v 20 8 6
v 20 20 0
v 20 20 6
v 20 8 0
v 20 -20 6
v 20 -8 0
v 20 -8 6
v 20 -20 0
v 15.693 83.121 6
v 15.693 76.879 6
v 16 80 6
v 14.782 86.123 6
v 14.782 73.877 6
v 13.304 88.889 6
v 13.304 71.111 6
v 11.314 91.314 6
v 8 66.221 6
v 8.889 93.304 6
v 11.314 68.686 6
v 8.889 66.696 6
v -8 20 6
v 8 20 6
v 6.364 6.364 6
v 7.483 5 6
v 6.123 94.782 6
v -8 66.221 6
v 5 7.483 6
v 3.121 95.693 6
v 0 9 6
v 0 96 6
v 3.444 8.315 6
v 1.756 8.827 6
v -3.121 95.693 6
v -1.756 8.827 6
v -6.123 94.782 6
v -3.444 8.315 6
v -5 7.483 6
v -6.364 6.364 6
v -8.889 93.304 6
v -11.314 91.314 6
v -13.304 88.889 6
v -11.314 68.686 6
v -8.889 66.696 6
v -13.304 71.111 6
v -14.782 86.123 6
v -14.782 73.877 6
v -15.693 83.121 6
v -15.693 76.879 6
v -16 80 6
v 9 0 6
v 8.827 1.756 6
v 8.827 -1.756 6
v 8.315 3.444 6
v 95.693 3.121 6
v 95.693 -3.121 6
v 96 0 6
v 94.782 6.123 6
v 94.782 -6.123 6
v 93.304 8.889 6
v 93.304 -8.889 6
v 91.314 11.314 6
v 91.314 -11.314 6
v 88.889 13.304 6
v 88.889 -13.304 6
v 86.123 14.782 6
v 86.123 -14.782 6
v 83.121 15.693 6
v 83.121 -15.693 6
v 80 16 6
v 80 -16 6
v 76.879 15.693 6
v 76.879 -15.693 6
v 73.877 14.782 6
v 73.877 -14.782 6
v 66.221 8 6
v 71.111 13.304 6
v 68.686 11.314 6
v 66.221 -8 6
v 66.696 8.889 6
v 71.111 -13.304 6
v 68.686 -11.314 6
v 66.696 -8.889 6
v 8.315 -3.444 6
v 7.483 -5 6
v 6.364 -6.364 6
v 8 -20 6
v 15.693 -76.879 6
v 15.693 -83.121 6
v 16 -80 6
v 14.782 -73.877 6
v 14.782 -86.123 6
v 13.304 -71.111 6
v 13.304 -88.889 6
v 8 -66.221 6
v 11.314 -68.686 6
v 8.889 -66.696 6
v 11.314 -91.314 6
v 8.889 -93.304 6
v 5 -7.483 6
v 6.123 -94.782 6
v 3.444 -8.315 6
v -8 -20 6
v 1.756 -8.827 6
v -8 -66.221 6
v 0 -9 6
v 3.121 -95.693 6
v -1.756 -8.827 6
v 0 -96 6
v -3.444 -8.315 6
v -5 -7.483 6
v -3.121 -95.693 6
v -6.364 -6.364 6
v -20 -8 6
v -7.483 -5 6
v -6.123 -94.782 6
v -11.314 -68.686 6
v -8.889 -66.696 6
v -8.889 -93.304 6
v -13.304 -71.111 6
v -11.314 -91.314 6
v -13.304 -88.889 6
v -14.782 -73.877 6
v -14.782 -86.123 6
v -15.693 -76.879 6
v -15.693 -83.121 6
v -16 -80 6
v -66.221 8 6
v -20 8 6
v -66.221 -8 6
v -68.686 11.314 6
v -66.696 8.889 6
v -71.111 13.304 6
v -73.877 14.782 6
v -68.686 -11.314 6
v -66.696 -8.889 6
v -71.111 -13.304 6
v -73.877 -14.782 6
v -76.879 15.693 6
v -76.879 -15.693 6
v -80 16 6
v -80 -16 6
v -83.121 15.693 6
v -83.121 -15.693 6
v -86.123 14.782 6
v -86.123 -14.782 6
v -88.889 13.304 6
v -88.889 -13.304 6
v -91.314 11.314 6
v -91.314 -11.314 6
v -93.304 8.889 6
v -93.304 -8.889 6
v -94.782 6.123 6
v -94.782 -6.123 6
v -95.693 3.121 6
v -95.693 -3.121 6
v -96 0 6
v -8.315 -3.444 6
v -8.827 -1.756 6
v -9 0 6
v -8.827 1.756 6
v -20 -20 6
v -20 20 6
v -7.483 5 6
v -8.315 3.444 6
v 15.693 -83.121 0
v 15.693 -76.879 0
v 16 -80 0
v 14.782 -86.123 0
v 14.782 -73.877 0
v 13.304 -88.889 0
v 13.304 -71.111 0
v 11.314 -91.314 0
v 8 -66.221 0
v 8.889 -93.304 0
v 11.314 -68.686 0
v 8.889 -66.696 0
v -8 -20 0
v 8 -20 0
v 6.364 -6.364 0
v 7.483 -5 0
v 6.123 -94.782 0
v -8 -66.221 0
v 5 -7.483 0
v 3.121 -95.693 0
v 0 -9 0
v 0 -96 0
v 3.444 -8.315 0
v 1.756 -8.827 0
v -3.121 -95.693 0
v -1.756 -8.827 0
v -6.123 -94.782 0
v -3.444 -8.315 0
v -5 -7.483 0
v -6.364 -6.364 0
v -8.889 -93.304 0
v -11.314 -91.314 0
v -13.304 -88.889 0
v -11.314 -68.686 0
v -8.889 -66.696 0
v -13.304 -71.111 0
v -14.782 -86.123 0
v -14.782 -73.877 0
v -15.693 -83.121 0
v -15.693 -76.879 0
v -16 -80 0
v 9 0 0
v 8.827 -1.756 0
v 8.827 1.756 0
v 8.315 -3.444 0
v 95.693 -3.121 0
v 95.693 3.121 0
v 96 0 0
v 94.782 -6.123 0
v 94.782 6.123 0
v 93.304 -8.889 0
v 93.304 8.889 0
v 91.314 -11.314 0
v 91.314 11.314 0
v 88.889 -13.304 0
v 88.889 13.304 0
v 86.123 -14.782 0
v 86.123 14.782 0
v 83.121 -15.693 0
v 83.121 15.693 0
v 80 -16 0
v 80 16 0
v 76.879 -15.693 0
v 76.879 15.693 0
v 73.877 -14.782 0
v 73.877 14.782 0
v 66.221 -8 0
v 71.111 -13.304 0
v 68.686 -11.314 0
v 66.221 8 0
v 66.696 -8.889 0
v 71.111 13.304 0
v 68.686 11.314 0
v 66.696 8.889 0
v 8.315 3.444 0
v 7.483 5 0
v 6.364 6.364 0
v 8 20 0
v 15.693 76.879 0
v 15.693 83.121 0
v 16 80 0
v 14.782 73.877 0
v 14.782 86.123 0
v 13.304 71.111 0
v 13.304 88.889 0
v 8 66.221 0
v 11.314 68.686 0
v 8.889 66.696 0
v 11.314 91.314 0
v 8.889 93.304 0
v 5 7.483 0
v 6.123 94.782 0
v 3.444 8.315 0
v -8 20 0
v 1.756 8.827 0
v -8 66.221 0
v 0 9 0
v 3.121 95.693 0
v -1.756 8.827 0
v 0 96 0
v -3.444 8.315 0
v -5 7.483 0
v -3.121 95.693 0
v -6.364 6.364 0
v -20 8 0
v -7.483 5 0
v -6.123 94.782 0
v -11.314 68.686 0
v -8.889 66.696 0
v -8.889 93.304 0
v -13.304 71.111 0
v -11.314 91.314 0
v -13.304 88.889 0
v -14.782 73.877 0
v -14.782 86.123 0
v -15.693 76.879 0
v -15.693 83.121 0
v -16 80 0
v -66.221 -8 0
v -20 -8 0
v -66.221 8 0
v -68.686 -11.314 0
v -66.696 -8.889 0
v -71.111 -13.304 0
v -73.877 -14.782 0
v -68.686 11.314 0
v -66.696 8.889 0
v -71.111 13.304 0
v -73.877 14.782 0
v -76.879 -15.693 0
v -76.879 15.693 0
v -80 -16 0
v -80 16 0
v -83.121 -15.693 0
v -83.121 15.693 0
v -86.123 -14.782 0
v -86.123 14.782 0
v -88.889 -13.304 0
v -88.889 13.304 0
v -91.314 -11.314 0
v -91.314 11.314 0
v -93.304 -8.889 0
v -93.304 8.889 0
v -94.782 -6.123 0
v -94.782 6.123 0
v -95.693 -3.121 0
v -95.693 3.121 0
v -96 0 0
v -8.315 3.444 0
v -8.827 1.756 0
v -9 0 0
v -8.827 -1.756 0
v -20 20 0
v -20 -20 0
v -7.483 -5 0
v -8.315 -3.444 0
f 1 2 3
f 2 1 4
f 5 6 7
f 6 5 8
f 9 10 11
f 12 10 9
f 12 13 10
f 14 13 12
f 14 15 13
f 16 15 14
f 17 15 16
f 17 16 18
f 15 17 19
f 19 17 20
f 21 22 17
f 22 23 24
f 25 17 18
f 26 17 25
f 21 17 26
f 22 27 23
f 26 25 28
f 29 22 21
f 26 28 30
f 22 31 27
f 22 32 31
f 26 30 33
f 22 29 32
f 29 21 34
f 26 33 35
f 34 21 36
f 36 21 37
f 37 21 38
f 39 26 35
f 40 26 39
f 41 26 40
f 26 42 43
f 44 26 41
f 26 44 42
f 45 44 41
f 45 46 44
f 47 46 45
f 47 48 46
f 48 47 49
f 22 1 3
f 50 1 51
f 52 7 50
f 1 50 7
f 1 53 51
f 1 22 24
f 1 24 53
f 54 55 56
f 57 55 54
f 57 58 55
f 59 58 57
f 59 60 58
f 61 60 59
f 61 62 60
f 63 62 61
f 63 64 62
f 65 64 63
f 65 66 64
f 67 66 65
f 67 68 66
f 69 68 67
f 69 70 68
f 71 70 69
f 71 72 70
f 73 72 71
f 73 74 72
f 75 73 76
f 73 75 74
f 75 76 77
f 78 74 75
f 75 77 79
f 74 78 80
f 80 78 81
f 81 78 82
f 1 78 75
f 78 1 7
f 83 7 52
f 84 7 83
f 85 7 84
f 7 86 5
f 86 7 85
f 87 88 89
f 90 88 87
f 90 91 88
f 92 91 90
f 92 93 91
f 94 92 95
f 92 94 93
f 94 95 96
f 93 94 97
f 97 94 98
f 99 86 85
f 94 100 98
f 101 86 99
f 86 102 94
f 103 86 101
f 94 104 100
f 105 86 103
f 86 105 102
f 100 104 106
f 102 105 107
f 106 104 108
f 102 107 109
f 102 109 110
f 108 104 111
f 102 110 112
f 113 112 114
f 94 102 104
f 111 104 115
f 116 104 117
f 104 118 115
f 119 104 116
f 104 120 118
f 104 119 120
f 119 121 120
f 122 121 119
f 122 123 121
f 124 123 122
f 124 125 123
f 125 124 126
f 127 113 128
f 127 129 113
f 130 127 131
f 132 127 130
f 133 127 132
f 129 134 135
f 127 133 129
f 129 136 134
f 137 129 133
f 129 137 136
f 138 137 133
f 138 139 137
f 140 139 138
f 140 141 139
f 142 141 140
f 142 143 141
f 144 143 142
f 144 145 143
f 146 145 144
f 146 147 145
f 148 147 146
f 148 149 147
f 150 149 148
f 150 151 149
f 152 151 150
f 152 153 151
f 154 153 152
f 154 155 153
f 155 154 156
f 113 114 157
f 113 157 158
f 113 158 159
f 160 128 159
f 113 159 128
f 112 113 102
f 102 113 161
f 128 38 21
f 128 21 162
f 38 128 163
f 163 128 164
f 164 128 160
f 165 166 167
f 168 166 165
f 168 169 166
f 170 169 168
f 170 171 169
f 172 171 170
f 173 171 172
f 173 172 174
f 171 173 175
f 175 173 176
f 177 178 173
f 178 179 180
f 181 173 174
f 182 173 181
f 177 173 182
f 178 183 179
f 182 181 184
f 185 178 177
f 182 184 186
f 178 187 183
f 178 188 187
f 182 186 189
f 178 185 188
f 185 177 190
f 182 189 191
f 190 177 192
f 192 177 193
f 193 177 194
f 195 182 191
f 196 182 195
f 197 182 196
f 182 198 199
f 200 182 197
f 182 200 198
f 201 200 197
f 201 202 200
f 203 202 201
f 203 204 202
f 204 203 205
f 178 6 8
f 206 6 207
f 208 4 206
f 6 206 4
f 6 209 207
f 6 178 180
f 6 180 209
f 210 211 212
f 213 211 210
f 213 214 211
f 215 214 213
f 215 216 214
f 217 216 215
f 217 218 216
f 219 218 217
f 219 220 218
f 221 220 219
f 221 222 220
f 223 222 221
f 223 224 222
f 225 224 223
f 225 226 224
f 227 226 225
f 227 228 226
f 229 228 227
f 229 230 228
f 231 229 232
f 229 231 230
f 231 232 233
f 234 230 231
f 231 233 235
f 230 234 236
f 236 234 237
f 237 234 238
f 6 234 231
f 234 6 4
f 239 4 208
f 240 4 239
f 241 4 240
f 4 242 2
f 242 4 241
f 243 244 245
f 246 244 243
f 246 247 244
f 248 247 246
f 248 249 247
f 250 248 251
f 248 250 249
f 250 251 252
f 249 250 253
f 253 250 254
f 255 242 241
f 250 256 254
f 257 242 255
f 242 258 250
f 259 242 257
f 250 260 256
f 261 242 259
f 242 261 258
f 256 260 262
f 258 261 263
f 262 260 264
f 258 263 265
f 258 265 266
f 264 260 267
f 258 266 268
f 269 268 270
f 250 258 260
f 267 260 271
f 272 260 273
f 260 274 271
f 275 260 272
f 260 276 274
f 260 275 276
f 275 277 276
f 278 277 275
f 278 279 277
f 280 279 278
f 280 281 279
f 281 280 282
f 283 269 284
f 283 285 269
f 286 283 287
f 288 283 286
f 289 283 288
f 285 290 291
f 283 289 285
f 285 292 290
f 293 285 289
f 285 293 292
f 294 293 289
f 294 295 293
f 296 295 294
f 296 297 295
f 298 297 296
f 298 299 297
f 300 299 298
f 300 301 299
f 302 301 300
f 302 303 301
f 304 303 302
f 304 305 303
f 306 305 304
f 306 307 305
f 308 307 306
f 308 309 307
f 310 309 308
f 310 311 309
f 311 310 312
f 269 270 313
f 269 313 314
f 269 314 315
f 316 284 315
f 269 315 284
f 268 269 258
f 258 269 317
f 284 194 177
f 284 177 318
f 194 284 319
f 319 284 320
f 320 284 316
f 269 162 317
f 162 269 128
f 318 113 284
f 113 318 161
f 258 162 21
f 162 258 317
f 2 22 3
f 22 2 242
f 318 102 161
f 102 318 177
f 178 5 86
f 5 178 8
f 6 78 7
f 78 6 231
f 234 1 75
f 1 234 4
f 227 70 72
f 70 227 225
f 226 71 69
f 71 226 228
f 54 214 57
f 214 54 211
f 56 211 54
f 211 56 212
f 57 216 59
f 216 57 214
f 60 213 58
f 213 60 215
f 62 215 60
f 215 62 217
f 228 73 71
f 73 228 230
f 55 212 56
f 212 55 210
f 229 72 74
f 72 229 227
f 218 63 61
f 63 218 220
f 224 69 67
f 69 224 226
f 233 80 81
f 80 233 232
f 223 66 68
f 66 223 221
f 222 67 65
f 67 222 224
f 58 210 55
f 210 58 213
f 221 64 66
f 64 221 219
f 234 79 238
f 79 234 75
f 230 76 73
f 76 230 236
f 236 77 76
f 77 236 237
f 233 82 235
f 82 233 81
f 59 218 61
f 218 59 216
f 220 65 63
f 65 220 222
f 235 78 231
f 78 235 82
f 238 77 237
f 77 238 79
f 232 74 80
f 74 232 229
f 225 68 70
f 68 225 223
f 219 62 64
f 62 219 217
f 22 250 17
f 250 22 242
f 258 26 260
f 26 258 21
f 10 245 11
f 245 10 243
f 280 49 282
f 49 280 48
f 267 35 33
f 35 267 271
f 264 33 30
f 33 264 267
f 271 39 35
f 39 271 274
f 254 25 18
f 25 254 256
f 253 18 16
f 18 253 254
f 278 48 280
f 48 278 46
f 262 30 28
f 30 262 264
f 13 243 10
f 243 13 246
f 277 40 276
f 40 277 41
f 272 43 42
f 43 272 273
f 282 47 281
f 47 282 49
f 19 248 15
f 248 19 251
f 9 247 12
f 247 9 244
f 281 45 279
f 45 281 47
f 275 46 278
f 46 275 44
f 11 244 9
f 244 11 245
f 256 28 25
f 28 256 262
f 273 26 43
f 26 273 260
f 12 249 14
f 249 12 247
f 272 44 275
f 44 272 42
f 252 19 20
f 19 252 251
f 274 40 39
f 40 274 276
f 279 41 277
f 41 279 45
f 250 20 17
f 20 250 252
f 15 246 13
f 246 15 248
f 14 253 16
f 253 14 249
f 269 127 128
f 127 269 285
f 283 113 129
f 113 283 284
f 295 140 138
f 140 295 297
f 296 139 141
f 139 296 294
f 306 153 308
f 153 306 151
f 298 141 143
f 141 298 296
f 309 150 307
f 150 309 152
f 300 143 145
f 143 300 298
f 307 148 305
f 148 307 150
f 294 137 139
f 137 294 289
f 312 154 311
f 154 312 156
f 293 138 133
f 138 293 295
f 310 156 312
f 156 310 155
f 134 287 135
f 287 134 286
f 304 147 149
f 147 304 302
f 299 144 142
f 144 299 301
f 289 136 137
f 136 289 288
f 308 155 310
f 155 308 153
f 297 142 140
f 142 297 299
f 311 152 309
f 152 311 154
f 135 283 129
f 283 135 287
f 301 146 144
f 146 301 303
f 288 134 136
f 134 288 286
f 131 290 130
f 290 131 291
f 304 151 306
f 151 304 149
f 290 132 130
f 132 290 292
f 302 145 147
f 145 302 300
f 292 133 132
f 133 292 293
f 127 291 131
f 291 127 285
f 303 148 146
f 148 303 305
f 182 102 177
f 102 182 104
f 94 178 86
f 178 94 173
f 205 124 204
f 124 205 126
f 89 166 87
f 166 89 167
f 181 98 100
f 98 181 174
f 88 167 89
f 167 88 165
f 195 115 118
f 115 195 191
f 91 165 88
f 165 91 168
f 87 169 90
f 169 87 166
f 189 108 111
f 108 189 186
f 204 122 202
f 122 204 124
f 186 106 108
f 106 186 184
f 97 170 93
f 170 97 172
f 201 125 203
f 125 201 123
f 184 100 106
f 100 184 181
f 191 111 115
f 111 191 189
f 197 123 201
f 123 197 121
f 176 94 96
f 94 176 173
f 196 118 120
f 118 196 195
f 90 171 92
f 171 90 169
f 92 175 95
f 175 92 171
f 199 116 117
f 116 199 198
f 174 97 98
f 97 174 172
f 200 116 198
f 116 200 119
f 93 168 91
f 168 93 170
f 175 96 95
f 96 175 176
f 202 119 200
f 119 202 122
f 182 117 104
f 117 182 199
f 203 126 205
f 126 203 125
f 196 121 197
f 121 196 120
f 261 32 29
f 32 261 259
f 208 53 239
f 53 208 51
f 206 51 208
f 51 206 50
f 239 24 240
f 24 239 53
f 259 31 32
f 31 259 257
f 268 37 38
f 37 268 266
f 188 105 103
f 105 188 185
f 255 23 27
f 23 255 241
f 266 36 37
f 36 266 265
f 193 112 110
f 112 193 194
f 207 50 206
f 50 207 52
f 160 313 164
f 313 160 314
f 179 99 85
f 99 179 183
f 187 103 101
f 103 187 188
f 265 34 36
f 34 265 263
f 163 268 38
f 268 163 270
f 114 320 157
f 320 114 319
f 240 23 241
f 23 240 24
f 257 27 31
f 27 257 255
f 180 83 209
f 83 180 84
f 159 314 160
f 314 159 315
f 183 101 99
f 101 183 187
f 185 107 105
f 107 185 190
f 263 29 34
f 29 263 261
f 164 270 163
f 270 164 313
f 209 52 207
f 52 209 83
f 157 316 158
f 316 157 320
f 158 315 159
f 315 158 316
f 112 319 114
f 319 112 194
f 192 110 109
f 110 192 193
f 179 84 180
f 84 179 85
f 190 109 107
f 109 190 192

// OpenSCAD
$fn = 32;

// ----------------------------------------------------------------------
// Quadcopter frame: 192 mm across the motor pads, arms 80 mm
// ----------------------------------------------------------------------

// --- parameters (mm) ---
hub = 40;                 // central plate size
plate_t = 6;              // plate thickness
arm_len = 80;             // hub centre to motor pad centre
bar_w = 16;               // arm width
pad_d = 32;               // motor pad diameter
centre_d = 18;            // central cut-out for the stack

module arm_bar() {
  /* flat bar: hull of a stub inside the hub and a box at the pad */
  hull() {
    translate([hub / 4, 0, plate_t / 2]) cube([bar_w, bar_w, plate_t], center = true);
    translate([arm_len, 0, plate_t / 2]) cube([bar_w, bar_w, plate_t], center = true);
  }
}

module pad() {
  translate([arm_len, 0, 0]) cylinder(h = plate_t, d = pad_d);
}

module frame() {
  translate([-hub / 2, -hub / 2, 0]) cube([hub, hub, plate_t]);
  rotate([0, 0, 0]) arm_bar();
  rotate([0, 0, 0]) pad();
  rotate([0, 0, 90]) arm_bar();
  rotate([0, 0, 90]) pad();
  rotate([0, 0, 180]) arm_bar();
  rotate([0, 0, 180]) pad();
  rotate([0, 0, 270]) arm_bar();
  rotate([0, 0, 270]) pad();
}

difference() {
  frame();
  translate([0, 0, -1]) cylinder(h = plate_t + 2, d = centre_d);
}
